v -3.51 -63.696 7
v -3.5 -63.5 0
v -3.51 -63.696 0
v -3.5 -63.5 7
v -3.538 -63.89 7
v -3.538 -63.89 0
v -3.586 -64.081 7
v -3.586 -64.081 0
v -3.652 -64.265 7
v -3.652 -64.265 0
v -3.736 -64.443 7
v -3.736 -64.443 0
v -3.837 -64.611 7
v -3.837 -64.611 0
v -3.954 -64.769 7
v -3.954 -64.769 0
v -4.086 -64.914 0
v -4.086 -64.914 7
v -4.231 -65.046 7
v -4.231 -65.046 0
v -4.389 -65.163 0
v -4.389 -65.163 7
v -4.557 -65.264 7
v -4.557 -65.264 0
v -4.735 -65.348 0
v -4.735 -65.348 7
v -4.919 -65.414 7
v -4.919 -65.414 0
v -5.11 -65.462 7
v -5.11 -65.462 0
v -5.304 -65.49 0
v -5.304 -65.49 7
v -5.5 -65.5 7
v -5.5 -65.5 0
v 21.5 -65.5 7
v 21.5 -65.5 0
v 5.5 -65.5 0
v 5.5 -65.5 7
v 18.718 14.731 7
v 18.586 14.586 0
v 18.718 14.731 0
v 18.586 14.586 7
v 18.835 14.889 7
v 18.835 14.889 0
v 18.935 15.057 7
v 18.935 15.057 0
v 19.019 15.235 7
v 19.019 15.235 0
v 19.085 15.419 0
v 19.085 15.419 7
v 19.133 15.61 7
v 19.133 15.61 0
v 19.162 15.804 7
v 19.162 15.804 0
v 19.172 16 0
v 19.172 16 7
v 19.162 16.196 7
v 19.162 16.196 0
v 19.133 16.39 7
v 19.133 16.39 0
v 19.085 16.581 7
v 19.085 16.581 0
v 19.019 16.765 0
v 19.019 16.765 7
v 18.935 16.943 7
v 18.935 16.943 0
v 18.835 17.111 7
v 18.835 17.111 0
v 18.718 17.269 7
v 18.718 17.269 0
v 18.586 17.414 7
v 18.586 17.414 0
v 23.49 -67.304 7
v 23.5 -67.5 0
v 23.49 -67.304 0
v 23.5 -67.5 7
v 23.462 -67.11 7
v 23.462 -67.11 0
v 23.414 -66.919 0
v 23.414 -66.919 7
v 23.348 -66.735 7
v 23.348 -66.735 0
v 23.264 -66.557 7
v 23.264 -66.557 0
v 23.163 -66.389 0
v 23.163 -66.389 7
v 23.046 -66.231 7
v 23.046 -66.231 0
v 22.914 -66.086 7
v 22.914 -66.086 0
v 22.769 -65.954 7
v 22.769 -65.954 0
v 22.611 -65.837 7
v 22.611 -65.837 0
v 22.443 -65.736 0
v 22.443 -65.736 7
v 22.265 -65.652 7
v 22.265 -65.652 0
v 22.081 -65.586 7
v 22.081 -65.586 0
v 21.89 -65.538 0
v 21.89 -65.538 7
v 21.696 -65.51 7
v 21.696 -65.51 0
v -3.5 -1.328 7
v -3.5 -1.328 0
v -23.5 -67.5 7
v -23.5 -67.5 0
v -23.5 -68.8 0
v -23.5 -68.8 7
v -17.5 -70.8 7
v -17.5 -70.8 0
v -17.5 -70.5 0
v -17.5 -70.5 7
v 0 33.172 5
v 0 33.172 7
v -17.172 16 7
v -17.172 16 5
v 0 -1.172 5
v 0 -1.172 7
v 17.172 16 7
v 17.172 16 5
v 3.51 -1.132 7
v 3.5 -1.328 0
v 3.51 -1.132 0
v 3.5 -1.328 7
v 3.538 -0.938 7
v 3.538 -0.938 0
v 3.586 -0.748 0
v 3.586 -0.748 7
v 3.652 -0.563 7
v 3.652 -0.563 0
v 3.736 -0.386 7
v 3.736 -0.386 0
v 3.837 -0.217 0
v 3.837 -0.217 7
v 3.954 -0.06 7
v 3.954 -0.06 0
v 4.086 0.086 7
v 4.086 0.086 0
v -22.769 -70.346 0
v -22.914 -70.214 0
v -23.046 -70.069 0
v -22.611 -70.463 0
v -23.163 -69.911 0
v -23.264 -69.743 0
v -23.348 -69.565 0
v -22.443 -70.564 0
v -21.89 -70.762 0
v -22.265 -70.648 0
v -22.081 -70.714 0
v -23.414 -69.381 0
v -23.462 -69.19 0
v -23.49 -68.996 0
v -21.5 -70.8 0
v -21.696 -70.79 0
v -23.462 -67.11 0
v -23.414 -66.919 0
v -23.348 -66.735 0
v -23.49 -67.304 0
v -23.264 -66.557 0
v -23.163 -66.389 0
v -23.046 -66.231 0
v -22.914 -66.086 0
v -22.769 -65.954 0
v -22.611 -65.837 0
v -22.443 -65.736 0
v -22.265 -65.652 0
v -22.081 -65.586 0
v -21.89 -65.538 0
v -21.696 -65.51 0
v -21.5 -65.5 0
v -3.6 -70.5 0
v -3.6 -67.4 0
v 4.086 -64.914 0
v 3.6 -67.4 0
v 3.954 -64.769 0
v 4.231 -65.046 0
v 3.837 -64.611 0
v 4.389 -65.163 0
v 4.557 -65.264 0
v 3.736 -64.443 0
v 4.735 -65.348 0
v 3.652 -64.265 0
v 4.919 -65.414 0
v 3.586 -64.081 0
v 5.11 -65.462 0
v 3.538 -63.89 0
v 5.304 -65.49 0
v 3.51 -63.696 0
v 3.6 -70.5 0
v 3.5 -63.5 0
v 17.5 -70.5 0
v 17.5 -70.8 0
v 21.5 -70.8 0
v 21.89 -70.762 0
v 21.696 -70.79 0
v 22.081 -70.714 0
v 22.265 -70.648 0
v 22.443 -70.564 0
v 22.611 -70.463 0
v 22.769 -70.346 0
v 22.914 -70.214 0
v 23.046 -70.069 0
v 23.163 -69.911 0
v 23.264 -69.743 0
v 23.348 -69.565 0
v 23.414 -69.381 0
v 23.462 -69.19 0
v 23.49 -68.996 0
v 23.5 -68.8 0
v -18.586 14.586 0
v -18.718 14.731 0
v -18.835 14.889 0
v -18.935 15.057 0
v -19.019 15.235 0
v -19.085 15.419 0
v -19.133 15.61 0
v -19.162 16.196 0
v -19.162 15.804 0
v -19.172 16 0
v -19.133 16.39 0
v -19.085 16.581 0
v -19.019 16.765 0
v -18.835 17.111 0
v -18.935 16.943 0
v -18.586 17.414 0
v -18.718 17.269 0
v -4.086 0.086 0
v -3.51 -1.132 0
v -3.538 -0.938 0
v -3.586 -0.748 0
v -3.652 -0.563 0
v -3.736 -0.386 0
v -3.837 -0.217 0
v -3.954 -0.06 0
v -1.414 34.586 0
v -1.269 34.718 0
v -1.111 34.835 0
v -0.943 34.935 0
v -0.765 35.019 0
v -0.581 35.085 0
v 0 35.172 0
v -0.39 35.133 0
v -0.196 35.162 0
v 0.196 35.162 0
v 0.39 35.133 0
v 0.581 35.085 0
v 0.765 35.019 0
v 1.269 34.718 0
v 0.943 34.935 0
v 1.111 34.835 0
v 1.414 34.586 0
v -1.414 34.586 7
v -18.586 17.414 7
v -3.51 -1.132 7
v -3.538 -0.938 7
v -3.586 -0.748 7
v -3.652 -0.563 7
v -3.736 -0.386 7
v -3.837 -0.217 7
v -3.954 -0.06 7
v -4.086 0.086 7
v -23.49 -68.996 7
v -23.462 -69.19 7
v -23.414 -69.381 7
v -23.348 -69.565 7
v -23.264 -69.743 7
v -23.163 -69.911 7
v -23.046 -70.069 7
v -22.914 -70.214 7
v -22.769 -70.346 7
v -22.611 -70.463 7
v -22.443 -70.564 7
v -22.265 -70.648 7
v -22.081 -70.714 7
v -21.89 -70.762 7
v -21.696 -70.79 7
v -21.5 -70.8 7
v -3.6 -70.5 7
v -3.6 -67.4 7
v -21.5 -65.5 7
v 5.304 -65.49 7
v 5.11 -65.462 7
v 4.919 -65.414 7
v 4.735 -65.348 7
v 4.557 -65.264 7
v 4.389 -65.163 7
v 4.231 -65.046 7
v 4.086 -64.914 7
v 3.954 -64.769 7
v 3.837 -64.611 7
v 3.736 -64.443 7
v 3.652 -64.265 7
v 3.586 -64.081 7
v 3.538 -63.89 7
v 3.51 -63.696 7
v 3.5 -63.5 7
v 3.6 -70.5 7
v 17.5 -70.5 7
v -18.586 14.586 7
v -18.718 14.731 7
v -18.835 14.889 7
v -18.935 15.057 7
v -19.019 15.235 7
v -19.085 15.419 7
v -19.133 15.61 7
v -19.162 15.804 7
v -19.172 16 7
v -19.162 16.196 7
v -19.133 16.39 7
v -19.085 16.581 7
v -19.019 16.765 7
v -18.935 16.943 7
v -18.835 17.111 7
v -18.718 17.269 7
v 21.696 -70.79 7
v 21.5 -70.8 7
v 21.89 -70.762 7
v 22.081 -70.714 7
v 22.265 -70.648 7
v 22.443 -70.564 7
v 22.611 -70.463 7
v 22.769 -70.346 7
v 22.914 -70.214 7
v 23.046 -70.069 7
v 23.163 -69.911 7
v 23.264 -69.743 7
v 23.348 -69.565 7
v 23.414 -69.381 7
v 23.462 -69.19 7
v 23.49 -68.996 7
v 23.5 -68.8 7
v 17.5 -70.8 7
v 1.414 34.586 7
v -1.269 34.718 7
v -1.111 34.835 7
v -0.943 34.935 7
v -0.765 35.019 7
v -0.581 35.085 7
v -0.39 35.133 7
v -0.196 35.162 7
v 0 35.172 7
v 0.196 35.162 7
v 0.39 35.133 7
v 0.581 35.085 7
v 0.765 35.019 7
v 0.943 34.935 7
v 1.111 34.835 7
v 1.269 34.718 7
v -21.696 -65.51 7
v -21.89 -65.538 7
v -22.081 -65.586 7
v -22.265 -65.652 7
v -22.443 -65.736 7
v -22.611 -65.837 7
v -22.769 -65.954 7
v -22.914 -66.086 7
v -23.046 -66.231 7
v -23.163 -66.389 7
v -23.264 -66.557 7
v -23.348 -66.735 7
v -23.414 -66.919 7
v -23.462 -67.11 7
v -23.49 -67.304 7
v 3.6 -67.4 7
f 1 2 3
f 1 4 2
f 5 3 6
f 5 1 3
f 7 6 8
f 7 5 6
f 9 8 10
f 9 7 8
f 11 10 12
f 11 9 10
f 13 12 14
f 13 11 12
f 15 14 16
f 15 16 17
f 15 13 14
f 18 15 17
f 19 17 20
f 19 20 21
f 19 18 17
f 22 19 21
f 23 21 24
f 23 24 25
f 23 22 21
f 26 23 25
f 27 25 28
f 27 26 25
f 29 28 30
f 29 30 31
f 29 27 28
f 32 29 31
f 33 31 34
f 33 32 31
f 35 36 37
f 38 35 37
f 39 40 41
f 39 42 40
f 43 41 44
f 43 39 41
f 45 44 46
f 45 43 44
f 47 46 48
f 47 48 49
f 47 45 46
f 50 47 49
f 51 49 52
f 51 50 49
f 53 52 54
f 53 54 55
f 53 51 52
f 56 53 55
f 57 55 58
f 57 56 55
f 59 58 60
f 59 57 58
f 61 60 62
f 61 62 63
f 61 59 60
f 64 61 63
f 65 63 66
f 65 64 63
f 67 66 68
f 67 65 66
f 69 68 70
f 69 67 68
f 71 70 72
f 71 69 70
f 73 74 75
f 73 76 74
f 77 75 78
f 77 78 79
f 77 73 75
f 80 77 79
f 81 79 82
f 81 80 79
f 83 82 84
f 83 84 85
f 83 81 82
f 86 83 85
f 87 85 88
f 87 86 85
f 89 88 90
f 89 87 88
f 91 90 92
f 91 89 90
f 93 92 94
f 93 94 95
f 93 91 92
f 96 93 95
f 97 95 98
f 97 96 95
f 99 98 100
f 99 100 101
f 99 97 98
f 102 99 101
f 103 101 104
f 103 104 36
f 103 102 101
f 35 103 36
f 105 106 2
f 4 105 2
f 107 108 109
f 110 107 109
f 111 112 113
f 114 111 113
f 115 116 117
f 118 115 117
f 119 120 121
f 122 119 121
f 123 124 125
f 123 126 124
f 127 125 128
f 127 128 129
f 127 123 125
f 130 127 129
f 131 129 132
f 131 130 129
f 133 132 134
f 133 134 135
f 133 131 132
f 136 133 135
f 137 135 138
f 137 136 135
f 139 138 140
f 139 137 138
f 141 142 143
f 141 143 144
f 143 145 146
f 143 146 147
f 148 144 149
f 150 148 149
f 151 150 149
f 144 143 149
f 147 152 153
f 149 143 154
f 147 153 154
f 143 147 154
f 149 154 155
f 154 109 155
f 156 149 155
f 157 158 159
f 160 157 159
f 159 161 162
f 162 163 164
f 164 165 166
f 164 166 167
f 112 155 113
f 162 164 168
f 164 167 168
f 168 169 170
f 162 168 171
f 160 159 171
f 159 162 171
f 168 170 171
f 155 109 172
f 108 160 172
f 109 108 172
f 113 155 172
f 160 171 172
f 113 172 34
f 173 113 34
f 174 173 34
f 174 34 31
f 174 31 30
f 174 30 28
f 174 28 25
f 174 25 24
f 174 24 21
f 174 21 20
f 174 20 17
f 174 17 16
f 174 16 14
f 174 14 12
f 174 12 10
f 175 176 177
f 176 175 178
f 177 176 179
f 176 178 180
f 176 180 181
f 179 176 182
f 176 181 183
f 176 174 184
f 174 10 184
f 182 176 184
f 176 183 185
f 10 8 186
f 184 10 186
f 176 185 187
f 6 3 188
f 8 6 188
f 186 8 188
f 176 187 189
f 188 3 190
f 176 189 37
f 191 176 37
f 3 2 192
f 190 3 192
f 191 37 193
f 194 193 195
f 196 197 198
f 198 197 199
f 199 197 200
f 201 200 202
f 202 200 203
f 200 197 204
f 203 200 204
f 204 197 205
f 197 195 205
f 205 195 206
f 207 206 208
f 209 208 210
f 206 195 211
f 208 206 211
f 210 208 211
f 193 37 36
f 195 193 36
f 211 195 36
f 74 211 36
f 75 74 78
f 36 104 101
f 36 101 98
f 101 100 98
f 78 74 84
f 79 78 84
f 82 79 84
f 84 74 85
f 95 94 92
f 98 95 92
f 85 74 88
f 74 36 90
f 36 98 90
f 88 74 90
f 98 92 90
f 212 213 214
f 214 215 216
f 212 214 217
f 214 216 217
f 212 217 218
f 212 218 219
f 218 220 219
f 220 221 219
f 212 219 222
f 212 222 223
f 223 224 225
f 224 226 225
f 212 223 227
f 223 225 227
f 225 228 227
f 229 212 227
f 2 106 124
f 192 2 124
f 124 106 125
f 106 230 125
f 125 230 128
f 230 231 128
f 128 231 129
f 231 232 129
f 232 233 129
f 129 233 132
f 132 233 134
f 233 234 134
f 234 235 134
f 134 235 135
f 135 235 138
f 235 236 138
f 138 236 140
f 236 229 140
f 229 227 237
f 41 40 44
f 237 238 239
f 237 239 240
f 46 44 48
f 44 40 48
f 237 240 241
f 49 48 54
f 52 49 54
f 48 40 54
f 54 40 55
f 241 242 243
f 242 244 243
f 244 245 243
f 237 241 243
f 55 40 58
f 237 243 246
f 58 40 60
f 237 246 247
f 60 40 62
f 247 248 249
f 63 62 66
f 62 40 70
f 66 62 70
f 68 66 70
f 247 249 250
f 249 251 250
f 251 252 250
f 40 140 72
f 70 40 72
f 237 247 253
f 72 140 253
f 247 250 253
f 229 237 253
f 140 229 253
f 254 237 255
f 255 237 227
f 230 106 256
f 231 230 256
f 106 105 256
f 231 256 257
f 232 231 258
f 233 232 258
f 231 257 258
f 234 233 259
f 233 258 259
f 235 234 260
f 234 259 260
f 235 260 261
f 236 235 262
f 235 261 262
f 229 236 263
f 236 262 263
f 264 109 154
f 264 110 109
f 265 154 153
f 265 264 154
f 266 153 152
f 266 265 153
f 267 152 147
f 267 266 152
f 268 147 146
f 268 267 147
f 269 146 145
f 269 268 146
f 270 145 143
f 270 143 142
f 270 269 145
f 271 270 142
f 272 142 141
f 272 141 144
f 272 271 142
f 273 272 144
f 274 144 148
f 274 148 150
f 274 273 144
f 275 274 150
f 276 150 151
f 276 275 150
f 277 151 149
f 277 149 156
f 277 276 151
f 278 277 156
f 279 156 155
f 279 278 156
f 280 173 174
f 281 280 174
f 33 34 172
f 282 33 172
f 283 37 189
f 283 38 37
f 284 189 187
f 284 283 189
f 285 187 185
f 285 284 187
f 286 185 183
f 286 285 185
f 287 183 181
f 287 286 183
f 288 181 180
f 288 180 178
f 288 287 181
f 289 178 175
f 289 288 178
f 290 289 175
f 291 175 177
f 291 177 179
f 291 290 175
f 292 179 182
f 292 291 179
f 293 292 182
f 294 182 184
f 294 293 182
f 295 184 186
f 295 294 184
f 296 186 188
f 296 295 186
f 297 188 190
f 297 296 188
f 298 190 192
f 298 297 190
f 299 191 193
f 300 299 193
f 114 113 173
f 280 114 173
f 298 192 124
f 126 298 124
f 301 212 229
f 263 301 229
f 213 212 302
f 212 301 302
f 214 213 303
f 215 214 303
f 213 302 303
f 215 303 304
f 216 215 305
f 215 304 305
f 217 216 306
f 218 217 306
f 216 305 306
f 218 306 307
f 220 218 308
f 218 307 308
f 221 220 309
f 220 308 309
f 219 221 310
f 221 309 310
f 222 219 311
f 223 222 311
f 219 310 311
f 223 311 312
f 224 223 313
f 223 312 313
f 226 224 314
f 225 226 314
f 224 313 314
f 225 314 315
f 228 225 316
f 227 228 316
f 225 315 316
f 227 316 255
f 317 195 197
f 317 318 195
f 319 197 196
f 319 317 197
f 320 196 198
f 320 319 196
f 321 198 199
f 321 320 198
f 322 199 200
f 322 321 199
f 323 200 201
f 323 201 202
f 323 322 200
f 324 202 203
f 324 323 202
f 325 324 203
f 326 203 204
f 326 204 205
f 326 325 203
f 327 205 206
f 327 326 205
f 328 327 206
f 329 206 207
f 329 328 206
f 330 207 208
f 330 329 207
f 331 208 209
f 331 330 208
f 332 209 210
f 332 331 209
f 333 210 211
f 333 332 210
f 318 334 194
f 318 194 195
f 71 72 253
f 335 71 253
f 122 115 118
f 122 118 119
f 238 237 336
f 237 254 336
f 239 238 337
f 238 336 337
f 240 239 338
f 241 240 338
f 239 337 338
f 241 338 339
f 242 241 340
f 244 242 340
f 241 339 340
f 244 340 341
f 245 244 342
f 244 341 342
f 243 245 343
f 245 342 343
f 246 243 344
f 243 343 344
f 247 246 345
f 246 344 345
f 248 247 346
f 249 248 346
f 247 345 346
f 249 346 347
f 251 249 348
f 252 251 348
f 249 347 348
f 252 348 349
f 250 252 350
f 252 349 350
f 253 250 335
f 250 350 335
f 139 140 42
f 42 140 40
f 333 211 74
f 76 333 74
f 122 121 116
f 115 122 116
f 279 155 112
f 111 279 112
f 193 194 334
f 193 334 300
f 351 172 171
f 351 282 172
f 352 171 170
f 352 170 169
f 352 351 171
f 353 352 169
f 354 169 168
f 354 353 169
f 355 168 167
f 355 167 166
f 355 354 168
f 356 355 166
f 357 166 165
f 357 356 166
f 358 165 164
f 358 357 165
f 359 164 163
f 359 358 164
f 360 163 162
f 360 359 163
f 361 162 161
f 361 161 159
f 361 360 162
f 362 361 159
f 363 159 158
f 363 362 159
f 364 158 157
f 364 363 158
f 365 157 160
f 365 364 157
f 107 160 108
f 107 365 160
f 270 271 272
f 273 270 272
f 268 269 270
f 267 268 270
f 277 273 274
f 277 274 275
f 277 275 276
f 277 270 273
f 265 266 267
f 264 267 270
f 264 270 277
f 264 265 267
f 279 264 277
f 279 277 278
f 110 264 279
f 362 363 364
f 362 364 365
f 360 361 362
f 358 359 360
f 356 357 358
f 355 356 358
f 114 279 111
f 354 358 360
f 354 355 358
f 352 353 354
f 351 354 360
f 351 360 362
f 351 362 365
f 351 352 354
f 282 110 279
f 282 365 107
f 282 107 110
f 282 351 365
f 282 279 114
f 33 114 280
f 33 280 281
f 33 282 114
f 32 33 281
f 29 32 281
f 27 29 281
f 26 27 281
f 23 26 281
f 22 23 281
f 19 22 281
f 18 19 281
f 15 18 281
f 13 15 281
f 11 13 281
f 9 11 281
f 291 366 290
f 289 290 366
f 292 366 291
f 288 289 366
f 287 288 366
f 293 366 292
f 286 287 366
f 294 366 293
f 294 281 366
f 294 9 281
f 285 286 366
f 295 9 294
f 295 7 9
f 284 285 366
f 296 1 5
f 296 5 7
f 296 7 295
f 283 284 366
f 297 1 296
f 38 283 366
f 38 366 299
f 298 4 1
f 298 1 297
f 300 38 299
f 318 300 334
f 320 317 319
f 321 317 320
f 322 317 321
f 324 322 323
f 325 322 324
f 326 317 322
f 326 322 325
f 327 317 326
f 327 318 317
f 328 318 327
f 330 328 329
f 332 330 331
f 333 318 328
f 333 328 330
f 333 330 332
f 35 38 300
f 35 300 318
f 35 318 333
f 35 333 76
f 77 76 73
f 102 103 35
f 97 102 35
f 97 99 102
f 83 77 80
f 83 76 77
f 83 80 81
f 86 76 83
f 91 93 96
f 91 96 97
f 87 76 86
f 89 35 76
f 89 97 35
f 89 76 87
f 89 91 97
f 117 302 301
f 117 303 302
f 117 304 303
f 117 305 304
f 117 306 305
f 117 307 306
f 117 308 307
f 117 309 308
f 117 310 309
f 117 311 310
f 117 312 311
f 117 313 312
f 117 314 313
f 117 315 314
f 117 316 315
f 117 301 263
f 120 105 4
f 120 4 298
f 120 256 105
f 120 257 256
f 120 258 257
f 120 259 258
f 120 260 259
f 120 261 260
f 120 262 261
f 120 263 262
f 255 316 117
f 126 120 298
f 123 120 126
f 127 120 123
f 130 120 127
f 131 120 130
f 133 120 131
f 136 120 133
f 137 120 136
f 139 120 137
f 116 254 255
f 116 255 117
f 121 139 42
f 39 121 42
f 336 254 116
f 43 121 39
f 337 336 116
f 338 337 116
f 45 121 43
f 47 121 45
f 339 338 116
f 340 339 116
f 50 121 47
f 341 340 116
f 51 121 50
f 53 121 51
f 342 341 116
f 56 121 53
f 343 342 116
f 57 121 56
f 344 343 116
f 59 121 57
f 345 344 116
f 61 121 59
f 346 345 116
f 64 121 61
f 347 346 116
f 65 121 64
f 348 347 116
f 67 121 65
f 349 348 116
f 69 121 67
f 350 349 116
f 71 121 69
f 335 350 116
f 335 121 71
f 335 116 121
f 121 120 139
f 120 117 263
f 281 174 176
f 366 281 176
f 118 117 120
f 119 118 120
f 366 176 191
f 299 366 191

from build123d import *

# Parameters (mm, degrees)
F0_W     = 6
F0_H     = 0.3
F1_DEPTH = 7
F3_DEPTH = 2
F4_R     = 2


# Not quite as in the source:
# - a feature names something its author has since deleted; it is built from what else it names


with BuildPart() as f1:
    # F0 (on Top) → F1 (new body)
    with BuildSketch(Plane.XY):
        Polygon((0, -4), (-3.5, -0.5), (-3.5, -65.5), (-23.5, -65.5), (-23.5, -70.5), (-17.5, -70.5), (-3.6, -70.5), (-3.6, -67.4), (3.6, -67.4), (3.6, -70.5), (17.5, -70.5), (23.5, -70.5), (23.5, -65.5), (3.5, -65.5), (3.5, -0.5), align=None)
        with Locations((-20.5, -70.65)):
            Rectangle(F0_W, F0_H)
        with Locations((20.5, -70.65)):
            Rectangle(F0_W, F0_H)
        Polygon((-20, 16), (-3.5, -0.5), (0, -4), (3.5, -0.5), (20, 16), (0, 36), align=None)
    extrude(amount=F1_DEPTH)

    # F2 (on face) → F3 (cut)
    with BuildSketch(Plane.XY.offset(7)):
        Polygon((0, 33.1715728753), (-17.1715728753, 16), (0, -1.1715728753), (17.1715728753, 16), align=None)
    extrude(amount=-F3_DEPTH, mode=Mode.SUBTRACT)

    # F4
    f4_edges = [f1.edges().sort_by_distance(p)[0] for p in [
        (3.5, -65.5, 3.5),
        (-3.5, -65.5, 3.5),
        (-23.5, -65.5, 3.5),
        (23.5, -65.5, 3.5),
        (-23.5, -70.8, 3.5),
        (23.5, -70.8, 3.5),
        (20, 16, 3.5),
        (0, 36, 3.5),
        (-20, 16, 3.5),
        (3.5, -0.5, 3.5),
        (-3.5, -0.5, 3.5),
    ]]
    fillet(f4_edges, radius=F4_R)


solid = f1.part
